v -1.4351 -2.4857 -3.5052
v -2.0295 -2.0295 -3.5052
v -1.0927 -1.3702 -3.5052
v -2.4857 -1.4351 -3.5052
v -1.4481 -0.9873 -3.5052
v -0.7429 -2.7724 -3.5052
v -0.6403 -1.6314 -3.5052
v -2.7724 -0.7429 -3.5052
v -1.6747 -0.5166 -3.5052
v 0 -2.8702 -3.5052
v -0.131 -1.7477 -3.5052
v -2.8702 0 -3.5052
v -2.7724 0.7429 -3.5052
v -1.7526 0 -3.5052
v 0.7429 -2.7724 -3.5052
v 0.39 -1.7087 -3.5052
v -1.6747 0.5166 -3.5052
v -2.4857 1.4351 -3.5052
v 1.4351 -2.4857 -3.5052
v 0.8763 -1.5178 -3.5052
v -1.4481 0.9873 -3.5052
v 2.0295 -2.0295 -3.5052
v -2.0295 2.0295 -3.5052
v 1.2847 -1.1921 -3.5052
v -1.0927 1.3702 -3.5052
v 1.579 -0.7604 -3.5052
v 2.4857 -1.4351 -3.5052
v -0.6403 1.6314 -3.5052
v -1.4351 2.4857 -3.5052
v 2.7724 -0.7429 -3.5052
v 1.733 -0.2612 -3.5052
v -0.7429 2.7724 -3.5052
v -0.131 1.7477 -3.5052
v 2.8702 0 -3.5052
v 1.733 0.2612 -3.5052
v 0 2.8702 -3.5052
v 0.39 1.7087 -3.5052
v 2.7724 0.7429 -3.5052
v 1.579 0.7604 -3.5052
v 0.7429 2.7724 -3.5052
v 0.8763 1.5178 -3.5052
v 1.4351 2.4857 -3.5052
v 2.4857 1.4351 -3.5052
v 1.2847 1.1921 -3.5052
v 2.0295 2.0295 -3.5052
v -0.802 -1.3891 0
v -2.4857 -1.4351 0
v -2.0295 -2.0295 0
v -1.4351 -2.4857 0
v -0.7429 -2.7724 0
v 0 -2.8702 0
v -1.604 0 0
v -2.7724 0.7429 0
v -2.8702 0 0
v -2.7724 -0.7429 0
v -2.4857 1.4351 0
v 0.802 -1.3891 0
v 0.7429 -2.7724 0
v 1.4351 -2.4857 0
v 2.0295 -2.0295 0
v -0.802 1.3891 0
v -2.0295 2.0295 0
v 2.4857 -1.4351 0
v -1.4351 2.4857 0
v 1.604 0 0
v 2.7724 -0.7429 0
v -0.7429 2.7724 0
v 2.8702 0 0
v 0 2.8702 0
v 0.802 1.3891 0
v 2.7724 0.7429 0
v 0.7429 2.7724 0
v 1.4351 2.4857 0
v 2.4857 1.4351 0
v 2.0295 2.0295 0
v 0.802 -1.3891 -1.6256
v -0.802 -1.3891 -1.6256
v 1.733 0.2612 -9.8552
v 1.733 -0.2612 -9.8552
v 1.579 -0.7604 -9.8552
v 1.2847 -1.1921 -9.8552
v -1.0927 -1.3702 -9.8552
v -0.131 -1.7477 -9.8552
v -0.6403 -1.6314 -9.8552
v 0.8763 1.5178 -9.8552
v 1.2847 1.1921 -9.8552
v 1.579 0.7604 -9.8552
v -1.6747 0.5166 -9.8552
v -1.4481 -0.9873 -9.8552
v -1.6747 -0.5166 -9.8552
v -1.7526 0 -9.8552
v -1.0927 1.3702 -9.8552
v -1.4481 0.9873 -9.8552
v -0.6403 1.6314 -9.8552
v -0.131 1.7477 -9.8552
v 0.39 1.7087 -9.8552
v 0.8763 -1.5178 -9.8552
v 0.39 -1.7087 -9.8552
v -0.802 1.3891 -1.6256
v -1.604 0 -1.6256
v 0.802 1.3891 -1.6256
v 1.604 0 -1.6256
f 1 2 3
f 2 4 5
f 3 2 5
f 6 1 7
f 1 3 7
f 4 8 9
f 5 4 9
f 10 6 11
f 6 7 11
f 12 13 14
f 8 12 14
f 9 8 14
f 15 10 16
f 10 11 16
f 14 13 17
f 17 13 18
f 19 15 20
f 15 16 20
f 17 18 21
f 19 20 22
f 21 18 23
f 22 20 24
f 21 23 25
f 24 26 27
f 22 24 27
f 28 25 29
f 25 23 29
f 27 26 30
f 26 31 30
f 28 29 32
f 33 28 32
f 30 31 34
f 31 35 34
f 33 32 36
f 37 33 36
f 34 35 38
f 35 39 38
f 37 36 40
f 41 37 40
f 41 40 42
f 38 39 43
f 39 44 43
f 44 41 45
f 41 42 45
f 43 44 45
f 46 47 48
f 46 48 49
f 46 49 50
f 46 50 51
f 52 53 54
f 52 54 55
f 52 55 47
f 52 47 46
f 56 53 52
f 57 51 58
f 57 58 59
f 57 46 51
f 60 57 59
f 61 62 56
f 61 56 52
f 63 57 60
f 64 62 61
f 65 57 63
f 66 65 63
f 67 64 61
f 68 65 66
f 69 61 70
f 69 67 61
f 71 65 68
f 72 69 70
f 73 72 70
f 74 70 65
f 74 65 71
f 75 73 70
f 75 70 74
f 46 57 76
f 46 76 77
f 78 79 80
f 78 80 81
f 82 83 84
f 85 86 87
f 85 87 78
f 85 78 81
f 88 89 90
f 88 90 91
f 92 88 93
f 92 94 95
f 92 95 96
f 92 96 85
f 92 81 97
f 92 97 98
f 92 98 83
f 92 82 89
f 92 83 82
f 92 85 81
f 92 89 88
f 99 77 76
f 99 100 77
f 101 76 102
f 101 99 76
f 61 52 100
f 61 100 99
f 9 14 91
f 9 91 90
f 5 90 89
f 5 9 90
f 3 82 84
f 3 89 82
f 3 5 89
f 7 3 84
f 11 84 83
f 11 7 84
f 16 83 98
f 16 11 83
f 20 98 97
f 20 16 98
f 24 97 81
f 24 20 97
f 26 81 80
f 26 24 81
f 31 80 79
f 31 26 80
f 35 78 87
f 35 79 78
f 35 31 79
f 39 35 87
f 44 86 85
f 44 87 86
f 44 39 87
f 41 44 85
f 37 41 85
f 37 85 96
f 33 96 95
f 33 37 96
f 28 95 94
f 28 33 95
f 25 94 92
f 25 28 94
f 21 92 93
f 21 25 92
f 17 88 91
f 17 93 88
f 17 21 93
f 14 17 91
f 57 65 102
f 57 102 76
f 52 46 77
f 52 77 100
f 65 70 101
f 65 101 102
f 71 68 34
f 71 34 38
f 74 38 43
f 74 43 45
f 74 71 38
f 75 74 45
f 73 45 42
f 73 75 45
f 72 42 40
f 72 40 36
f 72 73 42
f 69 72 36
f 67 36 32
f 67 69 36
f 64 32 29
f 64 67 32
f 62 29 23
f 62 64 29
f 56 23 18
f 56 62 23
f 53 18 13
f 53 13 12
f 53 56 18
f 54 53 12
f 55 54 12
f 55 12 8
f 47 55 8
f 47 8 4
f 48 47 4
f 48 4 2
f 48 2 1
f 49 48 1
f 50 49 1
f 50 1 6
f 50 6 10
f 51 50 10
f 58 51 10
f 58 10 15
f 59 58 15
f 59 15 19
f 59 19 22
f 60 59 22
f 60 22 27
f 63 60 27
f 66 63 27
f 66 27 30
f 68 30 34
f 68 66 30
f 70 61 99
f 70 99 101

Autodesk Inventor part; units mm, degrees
ref_plane "YZ Plane" through (0, 0, 0) normal (1, 0, 0) x (0, 1, 0)
ref_plane "XZ Plane" through (0, 0, 0) normal (0, 1, 0) x (-1, 0, 0)
ref_plane "XY Plane" through (0, 0, 0) normal (0, 0, 1) x (1, 0, 0)
sketch "Sketch1" plane through (0, 0, 0) normal (0, 0, 1) x (1, 0, 0)
  circle A0 centre (0, 0) radius 2.8702
  dimension "head_dia" = 5.7404
extrude "Extrusion1" add sketch "Sketch1" against normal blind 3.5052
sketch "Sketch2" plane through (0, 0, -3.5052) normal (0, 0, -1) x (-1, 0, 0)
  circle A0 centre (0, 0) radius 1.7526
  dimension "body_dia" = 3.5052
extrude "Extrusion2" add sketch "Sketch2" along normal blind 6.35
sketch "Sketch3" plane through (0, 0, 0) normal (0, 0, 1) x (1, 0, 0)
  line L0 (1.604, 0) -> (0.802, -1.3891)
  line L1 (0.802, -1.3891) -> (-0.802, -1.3891)
  line L2 (-0.802, -1.3891) -> (-1.604, 0)
  line L3 (-1.604, 0) -> (-0.802, 1.3891)
  line L4 (-0.802, 1.3891) -> (0.802, 1.3891)
  line L5 (0.802, 1.3891) -> (1.604, 0)
  point P0 (0, 0)
  point P1 (0, 0)
  dimension "allen" = 2.7781
extrude "Extrusion3" cut sketch "Sketch3" against normal blind 1.6256
properties part number "shcs-6-0250"
